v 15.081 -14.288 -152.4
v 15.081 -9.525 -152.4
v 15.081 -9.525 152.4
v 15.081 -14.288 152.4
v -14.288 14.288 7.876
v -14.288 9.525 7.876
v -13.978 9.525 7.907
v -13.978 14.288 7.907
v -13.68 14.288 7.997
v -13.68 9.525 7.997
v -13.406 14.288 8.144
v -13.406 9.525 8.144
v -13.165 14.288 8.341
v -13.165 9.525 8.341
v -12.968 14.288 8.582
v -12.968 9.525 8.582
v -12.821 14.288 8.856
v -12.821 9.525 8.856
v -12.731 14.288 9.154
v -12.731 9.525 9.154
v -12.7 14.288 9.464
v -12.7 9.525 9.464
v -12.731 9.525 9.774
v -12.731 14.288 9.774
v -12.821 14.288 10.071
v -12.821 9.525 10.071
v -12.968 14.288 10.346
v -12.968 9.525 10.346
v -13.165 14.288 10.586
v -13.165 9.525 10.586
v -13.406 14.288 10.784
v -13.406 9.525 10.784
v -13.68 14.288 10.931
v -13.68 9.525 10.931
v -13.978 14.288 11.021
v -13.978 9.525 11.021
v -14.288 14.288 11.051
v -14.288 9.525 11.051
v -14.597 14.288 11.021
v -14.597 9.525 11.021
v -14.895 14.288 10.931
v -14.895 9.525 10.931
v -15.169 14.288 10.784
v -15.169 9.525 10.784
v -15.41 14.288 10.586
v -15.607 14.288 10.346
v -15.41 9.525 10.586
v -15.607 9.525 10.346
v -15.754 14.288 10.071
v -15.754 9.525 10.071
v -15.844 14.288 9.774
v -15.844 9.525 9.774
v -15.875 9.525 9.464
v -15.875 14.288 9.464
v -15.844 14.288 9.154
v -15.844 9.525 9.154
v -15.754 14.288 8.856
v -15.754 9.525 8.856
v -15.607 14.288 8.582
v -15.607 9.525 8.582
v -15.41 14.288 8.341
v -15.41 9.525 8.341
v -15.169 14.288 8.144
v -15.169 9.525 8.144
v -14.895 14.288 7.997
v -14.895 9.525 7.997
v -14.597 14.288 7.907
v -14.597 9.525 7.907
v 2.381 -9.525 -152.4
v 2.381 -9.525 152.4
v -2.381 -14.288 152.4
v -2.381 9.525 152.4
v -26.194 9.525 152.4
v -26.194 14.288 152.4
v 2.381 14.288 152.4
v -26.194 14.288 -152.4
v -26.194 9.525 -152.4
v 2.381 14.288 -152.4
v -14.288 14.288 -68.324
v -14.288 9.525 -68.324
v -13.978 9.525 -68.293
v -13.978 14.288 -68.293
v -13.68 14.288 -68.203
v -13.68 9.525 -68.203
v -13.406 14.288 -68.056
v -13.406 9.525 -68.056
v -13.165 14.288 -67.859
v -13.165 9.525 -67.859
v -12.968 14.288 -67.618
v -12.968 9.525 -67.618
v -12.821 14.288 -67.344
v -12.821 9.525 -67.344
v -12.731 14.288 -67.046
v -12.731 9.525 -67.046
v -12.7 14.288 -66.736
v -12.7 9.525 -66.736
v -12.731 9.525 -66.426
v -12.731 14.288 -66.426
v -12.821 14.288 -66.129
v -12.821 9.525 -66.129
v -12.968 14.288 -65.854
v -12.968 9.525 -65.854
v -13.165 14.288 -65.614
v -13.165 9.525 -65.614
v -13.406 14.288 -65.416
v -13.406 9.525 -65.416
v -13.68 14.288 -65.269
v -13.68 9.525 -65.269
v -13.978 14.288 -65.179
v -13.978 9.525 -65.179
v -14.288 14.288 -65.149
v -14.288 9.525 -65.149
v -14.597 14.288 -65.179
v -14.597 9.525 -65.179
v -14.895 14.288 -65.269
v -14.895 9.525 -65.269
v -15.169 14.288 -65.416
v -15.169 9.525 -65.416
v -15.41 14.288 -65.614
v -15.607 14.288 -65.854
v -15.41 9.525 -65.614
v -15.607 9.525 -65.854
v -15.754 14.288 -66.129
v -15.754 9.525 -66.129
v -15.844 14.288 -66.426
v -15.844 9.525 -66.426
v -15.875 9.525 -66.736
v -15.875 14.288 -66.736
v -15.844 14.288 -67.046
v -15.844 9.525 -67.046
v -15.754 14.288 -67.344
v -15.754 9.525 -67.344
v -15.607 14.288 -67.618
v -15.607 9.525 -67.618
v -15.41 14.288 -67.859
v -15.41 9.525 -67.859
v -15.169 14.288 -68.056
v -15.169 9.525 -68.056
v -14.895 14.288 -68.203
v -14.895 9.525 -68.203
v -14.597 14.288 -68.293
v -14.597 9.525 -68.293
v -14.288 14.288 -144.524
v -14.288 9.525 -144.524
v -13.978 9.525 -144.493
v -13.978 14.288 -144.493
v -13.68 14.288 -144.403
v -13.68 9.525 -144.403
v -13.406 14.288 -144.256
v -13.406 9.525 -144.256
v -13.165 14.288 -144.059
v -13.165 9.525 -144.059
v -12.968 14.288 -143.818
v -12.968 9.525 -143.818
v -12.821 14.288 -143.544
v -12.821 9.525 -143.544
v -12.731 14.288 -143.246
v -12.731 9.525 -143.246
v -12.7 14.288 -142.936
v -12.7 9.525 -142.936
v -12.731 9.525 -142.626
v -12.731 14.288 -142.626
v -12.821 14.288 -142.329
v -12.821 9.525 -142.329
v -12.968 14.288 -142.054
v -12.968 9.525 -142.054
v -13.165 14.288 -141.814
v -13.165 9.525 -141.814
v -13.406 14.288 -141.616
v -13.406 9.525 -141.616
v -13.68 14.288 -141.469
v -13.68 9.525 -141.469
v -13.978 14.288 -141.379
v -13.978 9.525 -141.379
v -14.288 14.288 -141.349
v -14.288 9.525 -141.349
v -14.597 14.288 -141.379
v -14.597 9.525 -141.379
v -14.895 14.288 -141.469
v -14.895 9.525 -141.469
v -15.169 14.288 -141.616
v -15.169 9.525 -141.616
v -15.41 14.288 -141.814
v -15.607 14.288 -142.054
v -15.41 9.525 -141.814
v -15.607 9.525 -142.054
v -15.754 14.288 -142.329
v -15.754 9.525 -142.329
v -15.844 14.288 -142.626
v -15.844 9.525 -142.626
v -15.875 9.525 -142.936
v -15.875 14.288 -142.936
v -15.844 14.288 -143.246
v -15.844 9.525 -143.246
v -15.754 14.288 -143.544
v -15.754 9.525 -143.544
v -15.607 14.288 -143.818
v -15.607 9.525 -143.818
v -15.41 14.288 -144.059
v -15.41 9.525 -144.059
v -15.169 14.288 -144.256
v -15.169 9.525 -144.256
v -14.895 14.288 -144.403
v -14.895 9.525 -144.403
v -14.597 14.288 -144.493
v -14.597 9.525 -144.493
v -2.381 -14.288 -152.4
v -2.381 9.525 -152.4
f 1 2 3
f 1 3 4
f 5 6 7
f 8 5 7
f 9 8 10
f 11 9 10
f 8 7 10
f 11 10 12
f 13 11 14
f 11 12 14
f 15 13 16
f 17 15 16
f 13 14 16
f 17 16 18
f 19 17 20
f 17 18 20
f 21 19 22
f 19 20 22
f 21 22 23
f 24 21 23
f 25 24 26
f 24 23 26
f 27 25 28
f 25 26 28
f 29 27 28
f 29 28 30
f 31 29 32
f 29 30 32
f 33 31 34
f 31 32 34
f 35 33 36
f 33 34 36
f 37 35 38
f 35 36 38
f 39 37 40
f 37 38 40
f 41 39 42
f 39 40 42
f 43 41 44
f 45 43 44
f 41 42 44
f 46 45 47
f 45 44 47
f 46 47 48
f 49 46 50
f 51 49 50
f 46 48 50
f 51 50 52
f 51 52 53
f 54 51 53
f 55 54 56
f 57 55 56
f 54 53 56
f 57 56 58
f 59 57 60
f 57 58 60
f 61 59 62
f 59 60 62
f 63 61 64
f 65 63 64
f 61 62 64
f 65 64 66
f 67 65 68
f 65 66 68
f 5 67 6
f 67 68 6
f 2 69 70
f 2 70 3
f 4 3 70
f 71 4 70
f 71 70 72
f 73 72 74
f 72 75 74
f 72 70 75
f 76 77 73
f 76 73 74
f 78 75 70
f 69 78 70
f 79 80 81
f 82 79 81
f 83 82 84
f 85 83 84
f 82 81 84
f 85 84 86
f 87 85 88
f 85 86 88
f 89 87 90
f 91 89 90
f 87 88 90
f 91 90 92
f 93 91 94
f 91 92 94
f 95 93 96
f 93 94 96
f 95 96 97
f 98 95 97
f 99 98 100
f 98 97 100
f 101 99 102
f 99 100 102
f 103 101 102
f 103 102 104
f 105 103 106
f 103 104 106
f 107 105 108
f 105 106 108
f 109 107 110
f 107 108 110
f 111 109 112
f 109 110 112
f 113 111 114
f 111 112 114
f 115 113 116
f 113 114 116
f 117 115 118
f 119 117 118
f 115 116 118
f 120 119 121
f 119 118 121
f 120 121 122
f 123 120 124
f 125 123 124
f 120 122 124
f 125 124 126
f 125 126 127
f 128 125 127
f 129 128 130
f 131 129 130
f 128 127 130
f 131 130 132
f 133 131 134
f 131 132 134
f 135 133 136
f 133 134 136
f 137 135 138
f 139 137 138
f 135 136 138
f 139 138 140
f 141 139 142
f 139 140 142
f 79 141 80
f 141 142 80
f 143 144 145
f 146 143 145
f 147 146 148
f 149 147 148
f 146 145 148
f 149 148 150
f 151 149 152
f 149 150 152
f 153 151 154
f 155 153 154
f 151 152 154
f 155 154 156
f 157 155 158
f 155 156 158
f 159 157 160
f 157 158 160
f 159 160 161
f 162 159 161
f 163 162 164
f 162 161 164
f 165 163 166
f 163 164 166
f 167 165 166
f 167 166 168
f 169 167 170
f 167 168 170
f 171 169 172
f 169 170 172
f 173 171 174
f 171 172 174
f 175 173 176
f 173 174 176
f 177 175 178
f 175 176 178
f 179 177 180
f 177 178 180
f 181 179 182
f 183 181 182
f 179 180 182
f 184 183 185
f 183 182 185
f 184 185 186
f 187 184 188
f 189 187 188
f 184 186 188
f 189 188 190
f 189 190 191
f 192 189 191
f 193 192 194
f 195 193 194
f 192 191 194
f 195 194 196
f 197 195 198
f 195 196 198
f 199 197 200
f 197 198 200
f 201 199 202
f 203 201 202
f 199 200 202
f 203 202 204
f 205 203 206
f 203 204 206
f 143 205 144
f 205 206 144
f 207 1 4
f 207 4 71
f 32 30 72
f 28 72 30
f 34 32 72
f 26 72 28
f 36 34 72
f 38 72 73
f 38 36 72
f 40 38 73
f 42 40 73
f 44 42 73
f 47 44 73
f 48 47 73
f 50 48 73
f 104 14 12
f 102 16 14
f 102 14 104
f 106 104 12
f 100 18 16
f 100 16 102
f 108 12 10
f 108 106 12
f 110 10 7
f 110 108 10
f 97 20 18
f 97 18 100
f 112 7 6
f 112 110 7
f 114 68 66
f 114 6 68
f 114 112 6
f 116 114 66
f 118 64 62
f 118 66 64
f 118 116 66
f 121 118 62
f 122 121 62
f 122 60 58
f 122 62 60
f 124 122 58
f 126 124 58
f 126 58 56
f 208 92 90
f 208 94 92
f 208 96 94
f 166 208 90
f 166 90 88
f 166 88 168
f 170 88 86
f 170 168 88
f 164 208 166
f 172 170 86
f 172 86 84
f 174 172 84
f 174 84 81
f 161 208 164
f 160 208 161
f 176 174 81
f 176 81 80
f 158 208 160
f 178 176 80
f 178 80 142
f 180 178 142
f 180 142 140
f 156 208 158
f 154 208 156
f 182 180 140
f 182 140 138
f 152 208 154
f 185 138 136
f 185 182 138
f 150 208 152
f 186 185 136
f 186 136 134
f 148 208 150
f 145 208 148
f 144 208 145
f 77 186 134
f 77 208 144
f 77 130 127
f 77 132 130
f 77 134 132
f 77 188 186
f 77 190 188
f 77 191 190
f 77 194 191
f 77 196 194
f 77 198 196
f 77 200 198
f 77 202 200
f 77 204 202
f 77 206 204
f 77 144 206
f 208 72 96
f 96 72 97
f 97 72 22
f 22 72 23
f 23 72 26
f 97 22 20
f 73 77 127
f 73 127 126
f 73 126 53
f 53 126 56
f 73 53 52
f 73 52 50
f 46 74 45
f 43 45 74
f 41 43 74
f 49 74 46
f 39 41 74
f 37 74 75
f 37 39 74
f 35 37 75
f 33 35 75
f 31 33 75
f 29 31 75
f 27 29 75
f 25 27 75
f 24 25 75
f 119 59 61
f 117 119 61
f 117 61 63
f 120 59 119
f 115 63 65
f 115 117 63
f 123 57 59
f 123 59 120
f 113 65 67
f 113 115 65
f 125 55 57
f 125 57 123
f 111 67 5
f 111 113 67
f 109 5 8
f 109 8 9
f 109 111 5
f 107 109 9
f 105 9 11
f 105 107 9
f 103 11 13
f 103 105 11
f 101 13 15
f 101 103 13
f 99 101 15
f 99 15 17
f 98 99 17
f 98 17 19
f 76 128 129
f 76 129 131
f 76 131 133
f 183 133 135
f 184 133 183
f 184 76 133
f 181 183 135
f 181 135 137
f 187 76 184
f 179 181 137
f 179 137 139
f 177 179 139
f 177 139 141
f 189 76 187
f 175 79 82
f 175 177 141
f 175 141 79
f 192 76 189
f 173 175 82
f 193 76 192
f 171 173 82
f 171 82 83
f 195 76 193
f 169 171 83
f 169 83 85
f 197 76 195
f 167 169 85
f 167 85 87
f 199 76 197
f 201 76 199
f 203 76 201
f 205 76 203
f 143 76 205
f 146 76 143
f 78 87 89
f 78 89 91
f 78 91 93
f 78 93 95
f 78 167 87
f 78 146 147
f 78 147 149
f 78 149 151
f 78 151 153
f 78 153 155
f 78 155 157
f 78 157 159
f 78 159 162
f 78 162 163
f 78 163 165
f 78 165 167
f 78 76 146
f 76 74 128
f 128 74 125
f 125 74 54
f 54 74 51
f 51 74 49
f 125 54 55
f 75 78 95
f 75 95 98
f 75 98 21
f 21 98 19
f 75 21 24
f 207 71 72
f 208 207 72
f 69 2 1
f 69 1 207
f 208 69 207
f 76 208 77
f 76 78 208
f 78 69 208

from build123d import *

# Parameters (mm, degrees)
BOSS_EXTRUDE1_DEPTH      = 152.4
BOSS_EXTRUDE1_DEPTH_BACK = 152.4
SKETCH6_R                = 1.5875
CUT_EXTRUDE1_DEPTH       = 4.7625


with BuildPart() as part:
    # Sketch3 → Boss-Extrude1 (new, two sides: drawn at the far end of the back side and taken through both)
    with BuildSketch(Plane.XY.offset(-BOSS_EXTRUDE1_DEPTH_BACK)):
        Polygon((15.08125, -9.525), (15.08125, -14.2875), (-2.38125, -14.2875), (-2.38125, 9.525), (-26.19375, 9.525), (-26.19375, 14.2875), (2.38125, 14.2875), (2.38125, -9.525), align=None)
    extrude(amount=BOSS_EXTRUDE1_DEPTH + BOSS_EXTRUDE1_DEPTH_BACK)

    # Sketch6 → Cut-Extrude1 (cut)
    with BuildSketch(Plane.XZ.offset(-9.525)):
        with Locations(Location((-14.2875, 9.463870403, 0), (0, 0, 270))):
            Circle(SKETCH6_R)
        with Locations(Location((-14.2875, -66.736129597, 0), (0, 0, 270))):
            Circle(SKETCH6_R)
        with Locations(Location((-14.2875, -142.936129597, 0), (0, 0, 270))):
            Circle(SKETCH6_R)
    extrude(amount=-CUT_EXTRUDE1_DEPTH, mode=Mode.SUBTRACT)


solid = part.part
